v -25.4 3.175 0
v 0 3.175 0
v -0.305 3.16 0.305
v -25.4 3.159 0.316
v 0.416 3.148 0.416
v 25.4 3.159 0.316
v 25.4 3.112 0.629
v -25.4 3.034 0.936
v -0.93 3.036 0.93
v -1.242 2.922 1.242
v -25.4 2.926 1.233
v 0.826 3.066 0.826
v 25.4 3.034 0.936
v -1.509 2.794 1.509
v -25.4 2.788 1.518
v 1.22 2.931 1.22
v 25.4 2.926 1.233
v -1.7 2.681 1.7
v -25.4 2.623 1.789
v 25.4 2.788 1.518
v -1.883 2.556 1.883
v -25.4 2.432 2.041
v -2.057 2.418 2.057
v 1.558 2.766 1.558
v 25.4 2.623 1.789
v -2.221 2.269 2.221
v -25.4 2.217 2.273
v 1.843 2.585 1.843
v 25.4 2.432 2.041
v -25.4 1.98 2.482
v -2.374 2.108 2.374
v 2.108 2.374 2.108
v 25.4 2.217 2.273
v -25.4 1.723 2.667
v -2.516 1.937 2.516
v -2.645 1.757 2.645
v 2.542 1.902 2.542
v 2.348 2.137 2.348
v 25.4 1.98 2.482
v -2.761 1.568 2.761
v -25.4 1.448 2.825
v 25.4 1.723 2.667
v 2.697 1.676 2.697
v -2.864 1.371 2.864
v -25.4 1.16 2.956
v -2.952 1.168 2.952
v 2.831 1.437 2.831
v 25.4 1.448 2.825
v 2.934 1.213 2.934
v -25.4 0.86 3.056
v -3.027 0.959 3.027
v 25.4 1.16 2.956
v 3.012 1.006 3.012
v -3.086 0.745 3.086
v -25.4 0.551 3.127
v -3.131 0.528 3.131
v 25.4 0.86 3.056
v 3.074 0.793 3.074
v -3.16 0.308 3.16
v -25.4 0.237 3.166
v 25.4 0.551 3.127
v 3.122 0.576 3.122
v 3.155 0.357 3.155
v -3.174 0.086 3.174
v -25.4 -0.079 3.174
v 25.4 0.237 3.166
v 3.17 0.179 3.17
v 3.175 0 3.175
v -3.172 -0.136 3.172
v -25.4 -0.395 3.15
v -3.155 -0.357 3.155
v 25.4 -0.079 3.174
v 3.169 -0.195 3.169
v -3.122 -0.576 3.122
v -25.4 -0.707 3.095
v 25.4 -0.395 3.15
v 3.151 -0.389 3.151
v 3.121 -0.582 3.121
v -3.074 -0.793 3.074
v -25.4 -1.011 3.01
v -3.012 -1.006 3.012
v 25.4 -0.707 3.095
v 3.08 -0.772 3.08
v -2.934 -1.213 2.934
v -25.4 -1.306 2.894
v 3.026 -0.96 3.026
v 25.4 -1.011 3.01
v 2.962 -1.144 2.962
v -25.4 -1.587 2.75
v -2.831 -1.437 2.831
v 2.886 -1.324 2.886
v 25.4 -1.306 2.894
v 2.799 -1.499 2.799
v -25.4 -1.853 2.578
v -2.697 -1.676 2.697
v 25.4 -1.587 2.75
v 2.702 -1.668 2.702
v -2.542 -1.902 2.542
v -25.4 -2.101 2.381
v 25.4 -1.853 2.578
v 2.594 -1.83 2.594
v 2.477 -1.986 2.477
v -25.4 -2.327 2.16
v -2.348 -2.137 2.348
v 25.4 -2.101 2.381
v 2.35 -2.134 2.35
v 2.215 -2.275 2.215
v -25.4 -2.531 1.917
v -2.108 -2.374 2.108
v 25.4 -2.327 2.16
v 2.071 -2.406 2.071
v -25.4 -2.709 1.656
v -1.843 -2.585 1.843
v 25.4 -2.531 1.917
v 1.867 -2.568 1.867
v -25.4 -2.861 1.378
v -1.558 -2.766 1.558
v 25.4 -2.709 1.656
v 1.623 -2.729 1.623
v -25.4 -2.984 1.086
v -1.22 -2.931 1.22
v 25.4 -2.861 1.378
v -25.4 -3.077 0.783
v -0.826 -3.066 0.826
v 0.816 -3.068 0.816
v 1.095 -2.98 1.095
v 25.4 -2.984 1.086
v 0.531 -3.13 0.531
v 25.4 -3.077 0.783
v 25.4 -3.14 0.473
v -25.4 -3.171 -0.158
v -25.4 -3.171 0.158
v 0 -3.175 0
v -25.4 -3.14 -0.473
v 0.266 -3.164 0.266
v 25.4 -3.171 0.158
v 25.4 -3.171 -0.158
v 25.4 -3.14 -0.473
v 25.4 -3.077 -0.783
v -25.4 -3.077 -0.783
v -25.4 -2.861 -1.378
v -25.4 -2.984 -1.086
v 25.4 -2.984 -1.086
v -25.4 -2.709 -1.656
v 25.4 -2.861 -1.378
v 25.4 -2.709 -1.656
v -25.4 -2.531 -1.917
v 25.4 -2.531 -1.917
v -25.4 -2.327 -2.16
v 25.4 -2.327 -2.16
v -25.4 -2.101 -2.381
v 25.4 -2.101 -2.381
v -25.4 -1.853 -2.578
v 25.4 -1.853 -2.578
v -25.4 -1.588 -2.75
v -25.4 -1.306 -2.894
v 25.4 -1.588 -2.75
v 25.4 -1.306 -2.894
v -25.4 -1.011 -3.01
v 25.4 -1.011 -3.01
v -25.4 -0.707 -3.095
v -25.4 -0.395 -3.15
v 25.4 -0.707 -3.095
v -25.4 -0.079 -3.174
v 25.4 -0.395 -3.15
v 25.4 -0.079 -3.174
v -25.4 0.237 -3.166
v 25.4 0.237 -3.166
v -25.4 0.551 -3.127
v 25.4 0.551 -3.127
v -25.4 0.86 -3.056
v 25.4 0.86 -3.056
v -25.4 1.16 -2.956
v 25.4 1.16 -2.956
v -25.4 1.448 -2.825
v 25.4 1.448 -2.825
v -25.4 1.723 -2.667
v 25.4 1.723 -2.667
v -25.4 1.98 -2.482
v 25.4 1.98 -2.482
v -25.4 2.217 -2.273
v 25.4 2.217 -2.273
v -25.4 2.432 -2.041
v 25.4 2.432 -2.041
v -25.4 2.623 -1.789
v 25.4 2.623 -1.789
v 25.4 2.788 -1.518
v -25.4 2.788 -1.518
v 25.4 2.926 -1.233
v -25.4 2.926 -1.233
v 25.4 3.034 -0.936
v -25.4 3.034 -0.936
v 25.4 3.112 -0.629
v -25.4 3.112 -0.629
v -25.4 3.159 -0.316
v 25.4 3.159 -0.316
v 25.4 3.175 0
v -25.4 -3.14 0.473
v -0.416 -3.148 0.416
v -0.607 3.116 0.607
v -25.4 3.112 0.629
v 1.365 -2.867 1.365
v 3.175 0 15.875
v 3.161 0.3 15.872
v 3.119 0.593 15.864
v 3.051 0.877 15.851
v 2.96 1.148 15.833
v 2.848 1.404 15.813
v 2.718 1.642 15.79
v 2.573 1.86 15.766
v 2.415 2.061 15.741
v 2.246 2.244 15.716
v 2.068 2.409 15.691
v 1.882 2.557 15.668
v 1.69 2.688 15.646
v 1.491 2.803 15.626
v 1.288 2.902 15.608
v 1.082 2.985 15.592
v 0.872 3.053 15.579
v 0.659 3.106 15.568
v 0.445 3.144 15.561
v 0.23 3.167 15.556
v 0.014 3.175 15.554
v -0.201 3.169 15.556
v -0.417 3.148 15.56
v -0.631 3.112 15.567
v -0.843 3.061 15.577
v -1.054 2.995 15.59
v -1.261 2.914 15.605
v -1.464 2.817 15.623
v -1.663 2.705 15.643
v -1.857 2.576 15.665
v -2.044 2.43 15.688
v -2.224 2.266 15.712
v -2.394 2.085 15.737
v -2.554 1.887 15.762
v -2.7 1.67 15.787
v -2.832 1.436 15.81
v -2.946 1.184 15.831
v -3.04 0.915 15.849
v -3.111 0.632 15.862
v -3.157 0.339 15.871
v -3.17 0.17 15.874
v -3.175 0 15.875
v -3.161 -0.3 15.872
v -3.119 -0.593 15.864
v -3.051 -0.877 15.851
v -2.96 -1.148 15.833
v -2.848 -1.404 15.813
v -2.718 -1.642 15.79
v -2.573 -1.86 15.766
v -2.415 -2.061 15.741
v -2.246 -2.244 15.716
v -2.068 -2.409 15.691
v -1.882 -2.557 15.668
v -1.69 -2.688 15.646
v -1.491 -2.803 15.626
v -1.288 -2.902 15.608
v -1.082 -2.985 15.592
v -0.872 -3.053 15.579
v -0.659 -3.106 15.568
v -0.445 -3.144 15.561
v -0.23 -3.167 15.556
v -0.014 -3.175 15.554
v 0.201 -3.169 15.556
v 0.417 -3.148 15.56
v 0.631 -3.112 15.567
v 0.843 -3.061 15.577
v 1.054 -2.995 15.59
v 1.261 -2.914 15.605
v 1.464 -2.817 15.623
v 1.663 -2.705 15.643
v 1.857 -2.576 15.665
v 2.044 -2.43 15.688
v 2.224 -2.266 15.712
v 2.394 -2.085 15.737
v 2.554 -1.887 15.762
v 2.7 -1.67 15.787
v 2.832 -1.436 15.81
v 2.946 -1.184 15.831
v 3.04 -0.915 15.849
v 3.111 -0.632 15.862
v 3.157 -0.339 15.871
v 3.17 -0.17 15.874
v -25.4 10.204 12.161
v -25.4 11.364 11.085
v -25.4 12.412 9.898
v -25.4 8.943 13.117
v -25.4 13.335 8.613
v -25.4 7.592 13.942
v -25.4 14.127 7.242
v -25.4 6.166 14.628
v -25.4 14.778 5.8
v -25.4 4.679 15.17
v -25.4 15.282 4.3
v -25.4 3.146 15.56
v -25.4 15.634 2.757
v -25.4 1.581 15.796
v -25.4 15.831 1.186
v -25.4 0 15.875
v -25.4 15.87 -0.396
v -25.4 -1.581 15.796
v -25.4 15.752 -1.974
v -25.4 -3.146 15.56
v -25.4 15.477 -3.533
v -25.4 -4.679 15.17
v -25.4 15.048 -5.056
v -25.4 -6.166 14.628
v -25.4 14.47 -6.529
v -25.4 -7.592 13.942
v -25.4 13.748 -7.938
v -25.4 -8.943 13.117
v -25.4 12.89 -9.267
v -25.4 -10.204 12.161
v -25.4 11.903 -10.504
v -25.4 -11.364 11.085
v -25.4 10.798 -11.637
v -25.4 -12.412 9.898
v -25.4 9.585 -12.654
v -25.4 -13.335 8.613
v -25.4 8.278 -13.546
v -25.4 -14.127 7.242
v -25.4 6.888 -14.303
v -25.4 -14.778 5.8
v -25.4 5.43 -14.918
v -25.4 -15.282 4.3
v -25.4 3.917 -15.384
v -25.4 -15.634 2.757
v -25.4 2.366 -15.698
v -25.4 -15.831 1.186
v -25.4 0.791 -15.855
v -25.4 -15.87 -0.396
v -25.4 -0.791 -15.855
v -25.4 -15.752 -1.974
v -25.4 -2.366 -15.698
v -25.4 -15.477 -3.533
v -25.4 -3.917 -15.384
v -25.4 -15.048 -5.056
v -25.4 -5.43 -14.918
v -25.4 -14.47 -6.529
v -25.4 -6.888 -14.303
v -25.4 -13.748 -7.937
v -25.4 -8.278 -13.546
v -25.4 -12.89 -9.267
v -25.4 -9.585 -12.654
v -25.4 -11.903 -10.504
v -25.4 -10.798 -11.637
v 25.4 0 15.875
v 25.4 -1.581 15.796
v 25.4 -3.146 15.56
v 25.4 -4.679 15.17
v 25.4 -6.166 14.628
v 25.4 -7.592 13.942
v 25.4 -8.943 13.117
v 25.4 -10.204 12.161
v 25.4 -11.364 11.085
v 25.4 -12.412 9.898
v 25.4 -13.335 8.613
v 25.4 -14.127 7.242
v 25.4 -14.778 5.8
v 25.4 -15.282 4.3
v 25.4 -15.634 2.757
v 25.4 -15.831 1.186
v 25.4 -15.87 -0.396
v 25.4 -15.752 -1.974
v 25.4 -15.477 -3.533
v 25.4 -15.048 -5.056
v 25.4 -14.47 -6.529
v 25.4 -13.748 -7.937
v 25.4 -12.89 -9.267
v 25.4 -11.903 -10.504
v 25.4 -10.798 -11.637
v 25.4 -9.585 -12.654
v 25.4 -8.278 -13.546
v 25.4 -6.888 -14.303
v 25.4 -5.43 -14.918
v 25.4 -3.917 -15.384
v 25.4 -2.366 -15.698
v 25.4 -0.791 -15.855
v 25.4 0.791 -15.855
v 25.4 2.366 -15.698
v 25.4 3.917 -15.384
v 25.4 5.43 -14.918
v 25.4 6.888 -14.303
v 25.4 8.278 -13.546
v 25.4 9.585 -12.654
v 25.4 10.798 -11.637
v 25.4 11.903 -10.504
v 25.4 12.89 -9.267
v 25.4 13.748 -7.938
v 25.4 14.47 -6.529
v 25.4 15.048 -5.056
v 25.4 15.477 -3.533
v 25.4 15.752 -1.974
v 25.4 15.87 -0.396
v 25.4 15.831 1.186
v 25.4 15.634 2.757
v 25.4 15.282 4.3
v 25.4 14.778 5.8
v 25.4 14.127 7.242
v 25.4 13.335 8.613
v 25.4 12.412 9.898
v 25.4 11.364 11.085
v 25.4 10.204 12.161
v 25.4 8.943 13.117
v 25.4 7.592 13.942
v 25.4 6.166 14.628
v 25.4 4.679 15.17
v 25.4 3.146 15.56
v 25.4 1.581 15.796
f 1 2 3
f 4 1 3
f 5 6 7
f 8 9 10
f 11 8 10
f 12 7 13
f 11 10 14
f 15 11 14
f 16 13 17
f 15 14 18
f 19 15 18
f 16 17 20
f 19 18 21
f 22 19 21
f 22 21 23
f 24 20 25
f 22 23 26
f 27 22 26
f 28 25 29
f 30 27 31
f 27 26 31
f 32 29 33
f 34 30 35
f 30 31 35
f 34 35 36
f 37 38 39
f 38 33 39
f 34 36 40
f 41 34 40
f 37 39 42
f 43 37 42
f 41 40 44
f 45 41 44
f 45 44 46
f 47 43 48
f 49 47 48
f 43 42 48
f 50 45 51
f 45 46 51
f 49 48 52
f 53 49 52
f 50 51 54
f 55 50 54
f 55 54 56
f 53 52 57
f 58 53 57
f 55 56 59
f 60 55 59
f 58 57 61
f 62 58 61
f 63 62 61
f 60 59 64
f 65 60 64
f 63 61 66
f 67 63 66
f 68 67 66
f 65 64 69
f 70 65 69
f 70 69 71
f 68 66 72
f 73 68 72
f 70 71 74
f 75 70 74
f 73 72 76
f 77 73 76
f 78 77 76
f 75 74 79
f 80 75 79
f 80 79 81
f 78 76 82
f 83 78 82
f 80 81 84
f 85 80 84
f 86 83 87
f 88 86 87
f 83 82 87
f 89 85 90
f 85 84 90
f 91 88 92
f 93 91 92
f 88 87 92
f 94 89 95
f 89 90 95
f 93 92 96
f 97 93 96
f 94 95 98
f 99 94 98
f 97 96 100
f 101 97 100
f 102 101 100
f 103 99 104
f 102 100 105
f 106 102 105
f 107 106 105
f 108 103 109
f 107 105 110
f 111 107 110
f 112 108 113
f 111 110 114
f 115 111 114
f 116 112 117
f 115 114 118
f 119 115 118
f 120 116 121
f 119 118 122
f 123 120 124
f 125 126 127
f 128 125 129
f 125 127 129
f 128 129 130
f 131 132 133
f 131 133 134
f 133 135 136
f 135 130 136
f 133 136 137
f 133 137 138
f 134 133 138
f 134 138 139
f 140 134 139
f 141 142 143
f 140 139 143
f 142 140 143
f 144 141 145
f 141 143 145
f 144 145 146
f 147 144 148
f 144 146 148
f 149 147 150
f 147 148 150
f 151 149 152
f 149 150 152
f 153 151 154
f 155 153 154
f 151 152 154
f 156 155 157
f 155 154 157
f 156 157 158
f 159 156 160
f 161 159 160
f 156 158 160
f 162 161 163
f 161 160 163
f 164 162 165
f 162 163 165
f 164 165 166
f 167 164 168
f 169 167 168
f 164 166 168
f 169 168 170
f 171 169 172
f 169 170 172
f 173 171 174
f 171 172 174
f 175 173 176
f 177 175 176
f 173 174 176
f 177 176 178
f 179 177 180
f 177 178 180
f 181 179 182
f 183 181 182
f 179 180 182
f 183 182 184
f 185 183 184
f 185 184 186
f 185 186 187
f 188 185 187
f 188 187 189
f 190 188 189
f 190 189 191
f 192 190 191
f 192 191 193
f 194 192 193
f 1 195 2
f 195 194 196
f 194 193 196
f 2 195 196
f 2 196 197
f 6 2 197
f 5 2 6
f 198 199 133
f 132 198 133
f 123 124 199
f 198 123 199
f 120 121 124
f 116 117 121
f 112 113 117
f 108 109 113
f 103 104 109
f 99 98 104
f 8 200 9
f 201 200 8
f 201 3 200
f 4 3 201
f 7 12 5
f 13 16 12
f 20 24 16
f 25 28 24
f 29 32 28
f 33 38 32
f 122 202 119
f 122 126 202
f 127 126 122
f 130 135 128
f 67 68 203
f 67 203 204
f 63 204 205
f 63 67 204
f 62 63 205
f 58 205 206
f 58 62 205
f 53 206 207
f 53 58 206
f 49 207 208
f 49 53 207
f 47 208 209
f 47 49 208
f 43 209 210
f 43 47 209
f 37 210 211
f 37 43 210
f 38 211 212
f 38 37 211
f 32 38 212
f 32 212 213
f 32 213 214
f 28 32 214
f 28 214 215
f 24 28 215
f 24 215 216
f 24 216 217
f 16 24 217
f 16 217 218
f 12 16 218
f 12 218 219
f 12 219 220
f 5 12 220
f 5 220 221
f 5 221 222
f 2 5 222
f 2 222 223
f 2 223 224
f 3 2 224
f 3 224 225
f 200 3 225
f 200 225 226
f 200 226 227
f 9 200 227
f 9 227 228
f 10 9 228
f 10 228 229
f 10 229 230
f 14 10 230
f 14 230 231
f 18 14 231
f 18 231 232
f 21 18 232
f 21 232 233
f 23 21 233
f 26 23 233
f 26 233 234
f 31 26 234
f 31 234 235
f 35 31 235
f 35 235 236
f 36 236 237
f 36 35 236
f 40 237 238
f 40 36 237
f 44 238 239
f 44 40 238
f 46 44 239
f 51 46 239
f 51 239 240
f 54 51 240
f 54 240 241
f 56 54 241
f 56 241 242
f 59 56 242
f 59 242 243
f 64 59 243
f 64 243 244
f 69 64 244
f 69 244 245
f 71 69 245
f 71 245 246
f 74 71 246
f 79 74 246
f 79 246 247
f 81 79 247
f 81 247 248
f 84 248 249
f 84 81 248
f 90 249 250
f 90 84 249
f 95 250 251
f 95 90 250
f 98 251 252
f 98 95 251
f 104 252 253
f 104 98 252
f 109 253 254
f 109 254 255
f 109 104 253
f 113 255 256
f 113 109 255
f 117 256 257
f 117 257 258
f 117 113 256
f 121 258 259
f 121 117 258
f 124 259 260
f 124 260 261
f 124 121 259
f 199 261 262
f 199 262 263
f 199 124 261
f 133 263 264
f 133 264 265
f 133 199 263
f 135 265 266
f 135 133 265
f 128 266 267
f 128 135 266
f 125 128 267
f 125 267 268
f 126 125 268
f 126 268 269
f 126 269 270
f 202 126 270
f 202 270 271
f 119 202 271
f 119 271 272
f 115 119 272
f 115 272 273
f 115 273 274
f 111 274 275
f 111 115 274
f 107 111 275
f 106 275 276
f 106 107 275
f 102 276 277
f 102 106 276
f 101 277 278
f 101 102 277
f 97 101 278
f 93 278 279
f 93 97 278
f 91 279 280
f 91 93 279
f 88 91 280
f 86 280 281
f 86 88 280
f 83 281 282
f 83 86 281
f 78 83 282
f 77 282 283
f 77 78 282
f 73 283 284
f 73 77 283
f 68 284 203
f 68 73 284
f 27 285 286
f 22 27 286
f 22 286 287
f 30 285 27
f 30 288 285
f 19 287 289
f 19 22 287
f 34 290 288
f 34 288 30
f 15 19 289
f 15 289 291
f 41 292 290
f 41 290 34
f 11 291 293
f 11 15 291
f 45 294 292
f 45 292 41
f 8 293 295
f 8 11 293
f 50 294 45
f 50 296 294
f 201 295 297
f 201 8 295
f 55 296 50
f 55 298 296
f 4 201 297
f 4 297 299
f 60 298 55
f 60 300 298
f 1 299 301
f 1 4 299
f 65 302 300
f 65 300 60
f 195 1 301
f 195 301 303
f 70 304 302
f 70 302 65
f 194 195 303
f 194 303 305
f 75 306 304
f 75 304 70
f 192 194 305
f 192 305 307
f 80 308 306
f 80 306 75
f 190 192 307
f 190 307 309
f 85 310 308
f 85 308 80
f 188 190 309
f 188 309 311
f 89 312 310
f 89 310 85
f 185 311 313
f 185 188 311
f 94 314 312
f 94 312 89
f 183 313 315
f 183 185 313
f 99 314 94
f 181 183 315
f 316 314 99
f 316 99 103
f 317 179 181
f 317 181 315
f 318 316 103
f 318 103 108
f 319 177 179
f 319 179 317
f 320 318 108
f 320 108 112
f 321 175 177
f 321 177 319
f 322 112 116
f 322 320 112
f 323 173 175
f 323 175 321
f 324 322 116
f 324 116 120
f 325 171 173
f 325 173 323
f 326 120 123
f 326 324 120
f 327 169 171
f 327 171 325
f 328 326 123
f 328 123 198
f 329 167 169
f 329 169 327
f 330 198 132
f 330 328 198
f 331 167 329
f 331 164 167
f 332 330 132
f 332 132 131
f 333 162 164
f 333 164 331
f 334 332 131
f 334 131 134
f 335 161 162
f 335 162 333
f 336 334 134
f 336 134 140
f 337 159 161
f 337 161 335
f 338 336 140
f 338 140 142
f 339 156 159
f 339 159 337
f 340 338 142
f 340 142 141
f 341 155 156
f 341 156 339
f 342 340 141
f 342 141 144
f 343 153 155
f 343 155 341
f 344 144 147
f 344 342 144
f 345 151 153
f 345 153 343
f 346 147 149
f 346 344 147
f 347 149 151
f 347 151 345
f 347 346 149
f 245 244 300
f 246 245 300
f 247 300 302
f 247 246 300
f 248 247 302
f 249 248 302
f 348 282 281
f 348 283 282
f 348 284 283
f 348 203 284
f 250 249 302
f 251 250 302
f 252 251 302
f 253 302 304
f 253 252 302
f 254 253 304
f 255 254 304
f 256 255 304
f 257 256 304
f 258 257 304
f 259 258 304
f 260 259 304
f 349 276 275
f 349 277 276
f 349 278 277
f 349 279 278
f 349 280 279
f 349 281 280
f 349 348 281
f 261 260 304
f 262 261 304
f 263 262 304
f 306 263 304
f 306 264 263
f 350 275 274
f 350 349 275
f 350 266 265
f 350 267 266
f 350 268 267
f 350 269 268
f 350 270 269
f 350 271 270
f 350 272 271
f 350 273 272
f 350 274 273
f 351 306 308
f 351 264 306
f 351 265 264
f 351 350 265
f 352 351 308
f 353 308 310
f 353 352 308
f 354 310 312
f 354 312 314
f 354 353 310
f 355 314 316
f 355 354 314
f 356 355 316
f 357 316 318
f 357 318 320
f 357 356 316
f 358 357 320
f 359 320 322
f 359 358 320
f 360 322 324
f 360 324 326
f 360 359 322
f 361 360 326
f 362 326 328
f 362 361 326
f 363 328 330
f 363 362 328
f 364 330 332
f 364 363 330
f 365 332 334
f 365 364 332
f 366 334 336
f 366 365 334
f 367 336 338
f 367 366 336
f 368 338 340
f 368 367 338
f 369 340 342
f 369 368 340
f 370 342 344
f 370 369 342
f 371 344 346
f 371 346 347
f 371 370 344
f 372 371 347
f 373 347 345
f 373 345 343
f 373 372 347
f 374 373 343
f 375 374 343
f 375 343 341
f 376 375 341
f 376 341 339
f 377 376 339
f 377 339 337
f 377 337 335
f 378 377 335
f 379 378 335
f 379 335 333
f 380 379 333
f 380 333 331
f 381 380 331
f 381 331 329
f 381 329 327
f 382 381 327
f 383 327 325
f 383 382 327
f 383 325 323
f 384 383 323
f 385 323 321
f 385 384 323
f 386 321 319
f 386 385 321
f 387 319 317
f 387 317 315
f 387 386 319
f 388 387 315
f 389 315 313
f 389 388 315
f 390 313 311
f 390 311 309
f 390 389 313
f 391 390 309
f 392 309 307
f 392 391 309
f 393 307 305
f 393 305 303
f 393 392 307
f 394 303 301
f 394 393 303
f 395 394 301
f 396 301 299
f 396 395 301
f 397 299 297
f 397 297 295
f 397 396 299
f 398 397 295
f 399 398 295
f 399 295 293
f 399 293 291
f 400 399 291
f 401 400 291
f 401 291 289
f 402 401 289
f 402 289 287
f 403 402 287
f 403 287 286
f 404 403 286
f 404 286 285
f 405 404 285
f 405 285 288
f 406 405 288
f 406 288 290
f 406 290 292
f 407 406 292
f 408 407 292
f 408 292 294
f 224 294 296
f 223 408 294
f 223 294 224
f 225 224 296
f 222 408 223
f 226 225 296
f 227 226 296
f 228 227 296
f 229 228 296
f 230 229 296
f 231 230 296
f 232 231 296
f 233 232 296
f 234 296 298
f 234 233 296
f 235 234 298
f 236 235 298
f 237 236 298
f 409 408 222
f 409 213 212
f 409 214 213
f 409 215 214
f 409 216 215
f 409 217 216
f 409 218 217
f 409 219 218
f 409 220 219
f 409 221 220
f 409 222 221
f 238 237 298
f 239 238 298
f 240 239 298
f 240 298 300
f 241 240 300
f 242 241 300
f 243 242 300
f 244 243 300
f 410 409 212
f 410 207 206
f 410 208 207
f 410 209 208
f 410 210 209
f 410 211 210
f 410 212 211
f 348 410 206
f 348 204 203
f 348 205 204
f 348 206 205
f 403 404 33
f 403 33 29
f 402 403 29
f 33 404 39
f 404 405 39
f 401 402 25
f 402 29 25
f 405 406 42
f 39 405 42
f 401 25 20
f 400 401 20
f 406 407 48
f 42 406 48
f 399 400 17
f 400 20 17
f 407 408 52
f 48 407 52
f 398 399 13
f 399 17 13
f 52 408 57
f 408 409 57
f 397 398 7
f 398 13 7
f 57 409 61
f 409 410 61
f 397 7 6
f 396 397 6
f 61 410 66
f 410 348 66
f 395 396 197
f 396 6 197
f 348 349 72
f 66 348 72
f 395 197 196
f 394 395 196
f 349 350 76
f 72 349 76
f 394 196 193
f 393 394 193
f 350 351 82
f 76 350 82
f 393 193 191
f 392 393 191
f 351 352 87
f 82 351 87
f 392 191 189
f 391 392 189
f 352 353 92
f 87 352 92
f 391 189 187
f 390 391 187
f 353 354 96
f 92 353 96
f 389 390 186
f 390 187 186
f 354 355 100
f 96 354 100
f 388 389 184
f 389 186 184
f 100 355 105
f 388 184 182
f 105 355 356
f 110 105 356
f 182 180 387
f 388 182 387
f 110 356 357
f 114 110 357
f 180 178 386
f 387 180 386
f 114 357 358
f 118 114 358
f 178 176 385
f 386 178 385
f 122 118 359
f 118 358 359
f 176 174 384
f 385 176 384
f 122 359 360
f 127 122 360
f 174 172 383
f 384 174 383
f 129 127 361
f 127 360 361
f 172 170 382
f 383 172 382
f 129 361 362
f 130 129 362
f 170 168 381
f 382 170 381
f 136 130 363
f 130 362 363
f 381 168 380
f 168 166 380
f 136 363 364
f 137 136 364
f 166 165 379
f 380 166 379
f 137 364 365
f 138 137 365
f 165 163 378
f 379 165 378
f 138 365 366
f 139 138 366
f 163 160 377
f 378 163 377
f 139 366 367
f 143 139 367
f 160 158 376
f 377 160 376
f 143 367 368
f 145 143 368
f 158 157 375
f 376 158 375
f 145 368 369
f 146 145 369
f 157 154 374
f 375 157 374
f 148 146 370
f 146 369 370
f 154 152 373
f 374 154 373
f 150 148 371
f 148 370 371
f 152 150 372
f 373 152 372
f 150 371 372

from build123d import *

# Parameters (mm, degrees)
F0_W     = 50.8
F0_H     = 15.875
F2_R     = 3.175
F3_DEPTH = 15.876
F4_R     = 3.175
F5_DEPTH = 50.8010001


# Not quite as in the source:
# - a feature names something its author has since deleted; it is built from what else it names


with BuildPart() as f1:
    # F0 (on Front) → F1 (revolve)
    with BuildSketch(Plane.XZ):
        with Locations((0, 7.9375)):
            Rectangle(F0_W, F0_H)
    revolve(axis=Axis((8.9611150324, 0, 0), (1, 0, 0)))

    # F2 (on Top) → F3 (cut, through all)
    with BuildSketch(Plane.XY):
        Circle(F2_R)
    extrude(amount=F3_DEPTH, mode=Mode.SUBTRACT)

    # F4 (on face) → F5 (cut, through all)
    with BuildSketch(Plane.YZ.offset(25.4)):
        Circle(F4_R)
    extrude(amount=-F5_DEPTH, mode=Mode.SUBTRACT)


solid = f1.part
